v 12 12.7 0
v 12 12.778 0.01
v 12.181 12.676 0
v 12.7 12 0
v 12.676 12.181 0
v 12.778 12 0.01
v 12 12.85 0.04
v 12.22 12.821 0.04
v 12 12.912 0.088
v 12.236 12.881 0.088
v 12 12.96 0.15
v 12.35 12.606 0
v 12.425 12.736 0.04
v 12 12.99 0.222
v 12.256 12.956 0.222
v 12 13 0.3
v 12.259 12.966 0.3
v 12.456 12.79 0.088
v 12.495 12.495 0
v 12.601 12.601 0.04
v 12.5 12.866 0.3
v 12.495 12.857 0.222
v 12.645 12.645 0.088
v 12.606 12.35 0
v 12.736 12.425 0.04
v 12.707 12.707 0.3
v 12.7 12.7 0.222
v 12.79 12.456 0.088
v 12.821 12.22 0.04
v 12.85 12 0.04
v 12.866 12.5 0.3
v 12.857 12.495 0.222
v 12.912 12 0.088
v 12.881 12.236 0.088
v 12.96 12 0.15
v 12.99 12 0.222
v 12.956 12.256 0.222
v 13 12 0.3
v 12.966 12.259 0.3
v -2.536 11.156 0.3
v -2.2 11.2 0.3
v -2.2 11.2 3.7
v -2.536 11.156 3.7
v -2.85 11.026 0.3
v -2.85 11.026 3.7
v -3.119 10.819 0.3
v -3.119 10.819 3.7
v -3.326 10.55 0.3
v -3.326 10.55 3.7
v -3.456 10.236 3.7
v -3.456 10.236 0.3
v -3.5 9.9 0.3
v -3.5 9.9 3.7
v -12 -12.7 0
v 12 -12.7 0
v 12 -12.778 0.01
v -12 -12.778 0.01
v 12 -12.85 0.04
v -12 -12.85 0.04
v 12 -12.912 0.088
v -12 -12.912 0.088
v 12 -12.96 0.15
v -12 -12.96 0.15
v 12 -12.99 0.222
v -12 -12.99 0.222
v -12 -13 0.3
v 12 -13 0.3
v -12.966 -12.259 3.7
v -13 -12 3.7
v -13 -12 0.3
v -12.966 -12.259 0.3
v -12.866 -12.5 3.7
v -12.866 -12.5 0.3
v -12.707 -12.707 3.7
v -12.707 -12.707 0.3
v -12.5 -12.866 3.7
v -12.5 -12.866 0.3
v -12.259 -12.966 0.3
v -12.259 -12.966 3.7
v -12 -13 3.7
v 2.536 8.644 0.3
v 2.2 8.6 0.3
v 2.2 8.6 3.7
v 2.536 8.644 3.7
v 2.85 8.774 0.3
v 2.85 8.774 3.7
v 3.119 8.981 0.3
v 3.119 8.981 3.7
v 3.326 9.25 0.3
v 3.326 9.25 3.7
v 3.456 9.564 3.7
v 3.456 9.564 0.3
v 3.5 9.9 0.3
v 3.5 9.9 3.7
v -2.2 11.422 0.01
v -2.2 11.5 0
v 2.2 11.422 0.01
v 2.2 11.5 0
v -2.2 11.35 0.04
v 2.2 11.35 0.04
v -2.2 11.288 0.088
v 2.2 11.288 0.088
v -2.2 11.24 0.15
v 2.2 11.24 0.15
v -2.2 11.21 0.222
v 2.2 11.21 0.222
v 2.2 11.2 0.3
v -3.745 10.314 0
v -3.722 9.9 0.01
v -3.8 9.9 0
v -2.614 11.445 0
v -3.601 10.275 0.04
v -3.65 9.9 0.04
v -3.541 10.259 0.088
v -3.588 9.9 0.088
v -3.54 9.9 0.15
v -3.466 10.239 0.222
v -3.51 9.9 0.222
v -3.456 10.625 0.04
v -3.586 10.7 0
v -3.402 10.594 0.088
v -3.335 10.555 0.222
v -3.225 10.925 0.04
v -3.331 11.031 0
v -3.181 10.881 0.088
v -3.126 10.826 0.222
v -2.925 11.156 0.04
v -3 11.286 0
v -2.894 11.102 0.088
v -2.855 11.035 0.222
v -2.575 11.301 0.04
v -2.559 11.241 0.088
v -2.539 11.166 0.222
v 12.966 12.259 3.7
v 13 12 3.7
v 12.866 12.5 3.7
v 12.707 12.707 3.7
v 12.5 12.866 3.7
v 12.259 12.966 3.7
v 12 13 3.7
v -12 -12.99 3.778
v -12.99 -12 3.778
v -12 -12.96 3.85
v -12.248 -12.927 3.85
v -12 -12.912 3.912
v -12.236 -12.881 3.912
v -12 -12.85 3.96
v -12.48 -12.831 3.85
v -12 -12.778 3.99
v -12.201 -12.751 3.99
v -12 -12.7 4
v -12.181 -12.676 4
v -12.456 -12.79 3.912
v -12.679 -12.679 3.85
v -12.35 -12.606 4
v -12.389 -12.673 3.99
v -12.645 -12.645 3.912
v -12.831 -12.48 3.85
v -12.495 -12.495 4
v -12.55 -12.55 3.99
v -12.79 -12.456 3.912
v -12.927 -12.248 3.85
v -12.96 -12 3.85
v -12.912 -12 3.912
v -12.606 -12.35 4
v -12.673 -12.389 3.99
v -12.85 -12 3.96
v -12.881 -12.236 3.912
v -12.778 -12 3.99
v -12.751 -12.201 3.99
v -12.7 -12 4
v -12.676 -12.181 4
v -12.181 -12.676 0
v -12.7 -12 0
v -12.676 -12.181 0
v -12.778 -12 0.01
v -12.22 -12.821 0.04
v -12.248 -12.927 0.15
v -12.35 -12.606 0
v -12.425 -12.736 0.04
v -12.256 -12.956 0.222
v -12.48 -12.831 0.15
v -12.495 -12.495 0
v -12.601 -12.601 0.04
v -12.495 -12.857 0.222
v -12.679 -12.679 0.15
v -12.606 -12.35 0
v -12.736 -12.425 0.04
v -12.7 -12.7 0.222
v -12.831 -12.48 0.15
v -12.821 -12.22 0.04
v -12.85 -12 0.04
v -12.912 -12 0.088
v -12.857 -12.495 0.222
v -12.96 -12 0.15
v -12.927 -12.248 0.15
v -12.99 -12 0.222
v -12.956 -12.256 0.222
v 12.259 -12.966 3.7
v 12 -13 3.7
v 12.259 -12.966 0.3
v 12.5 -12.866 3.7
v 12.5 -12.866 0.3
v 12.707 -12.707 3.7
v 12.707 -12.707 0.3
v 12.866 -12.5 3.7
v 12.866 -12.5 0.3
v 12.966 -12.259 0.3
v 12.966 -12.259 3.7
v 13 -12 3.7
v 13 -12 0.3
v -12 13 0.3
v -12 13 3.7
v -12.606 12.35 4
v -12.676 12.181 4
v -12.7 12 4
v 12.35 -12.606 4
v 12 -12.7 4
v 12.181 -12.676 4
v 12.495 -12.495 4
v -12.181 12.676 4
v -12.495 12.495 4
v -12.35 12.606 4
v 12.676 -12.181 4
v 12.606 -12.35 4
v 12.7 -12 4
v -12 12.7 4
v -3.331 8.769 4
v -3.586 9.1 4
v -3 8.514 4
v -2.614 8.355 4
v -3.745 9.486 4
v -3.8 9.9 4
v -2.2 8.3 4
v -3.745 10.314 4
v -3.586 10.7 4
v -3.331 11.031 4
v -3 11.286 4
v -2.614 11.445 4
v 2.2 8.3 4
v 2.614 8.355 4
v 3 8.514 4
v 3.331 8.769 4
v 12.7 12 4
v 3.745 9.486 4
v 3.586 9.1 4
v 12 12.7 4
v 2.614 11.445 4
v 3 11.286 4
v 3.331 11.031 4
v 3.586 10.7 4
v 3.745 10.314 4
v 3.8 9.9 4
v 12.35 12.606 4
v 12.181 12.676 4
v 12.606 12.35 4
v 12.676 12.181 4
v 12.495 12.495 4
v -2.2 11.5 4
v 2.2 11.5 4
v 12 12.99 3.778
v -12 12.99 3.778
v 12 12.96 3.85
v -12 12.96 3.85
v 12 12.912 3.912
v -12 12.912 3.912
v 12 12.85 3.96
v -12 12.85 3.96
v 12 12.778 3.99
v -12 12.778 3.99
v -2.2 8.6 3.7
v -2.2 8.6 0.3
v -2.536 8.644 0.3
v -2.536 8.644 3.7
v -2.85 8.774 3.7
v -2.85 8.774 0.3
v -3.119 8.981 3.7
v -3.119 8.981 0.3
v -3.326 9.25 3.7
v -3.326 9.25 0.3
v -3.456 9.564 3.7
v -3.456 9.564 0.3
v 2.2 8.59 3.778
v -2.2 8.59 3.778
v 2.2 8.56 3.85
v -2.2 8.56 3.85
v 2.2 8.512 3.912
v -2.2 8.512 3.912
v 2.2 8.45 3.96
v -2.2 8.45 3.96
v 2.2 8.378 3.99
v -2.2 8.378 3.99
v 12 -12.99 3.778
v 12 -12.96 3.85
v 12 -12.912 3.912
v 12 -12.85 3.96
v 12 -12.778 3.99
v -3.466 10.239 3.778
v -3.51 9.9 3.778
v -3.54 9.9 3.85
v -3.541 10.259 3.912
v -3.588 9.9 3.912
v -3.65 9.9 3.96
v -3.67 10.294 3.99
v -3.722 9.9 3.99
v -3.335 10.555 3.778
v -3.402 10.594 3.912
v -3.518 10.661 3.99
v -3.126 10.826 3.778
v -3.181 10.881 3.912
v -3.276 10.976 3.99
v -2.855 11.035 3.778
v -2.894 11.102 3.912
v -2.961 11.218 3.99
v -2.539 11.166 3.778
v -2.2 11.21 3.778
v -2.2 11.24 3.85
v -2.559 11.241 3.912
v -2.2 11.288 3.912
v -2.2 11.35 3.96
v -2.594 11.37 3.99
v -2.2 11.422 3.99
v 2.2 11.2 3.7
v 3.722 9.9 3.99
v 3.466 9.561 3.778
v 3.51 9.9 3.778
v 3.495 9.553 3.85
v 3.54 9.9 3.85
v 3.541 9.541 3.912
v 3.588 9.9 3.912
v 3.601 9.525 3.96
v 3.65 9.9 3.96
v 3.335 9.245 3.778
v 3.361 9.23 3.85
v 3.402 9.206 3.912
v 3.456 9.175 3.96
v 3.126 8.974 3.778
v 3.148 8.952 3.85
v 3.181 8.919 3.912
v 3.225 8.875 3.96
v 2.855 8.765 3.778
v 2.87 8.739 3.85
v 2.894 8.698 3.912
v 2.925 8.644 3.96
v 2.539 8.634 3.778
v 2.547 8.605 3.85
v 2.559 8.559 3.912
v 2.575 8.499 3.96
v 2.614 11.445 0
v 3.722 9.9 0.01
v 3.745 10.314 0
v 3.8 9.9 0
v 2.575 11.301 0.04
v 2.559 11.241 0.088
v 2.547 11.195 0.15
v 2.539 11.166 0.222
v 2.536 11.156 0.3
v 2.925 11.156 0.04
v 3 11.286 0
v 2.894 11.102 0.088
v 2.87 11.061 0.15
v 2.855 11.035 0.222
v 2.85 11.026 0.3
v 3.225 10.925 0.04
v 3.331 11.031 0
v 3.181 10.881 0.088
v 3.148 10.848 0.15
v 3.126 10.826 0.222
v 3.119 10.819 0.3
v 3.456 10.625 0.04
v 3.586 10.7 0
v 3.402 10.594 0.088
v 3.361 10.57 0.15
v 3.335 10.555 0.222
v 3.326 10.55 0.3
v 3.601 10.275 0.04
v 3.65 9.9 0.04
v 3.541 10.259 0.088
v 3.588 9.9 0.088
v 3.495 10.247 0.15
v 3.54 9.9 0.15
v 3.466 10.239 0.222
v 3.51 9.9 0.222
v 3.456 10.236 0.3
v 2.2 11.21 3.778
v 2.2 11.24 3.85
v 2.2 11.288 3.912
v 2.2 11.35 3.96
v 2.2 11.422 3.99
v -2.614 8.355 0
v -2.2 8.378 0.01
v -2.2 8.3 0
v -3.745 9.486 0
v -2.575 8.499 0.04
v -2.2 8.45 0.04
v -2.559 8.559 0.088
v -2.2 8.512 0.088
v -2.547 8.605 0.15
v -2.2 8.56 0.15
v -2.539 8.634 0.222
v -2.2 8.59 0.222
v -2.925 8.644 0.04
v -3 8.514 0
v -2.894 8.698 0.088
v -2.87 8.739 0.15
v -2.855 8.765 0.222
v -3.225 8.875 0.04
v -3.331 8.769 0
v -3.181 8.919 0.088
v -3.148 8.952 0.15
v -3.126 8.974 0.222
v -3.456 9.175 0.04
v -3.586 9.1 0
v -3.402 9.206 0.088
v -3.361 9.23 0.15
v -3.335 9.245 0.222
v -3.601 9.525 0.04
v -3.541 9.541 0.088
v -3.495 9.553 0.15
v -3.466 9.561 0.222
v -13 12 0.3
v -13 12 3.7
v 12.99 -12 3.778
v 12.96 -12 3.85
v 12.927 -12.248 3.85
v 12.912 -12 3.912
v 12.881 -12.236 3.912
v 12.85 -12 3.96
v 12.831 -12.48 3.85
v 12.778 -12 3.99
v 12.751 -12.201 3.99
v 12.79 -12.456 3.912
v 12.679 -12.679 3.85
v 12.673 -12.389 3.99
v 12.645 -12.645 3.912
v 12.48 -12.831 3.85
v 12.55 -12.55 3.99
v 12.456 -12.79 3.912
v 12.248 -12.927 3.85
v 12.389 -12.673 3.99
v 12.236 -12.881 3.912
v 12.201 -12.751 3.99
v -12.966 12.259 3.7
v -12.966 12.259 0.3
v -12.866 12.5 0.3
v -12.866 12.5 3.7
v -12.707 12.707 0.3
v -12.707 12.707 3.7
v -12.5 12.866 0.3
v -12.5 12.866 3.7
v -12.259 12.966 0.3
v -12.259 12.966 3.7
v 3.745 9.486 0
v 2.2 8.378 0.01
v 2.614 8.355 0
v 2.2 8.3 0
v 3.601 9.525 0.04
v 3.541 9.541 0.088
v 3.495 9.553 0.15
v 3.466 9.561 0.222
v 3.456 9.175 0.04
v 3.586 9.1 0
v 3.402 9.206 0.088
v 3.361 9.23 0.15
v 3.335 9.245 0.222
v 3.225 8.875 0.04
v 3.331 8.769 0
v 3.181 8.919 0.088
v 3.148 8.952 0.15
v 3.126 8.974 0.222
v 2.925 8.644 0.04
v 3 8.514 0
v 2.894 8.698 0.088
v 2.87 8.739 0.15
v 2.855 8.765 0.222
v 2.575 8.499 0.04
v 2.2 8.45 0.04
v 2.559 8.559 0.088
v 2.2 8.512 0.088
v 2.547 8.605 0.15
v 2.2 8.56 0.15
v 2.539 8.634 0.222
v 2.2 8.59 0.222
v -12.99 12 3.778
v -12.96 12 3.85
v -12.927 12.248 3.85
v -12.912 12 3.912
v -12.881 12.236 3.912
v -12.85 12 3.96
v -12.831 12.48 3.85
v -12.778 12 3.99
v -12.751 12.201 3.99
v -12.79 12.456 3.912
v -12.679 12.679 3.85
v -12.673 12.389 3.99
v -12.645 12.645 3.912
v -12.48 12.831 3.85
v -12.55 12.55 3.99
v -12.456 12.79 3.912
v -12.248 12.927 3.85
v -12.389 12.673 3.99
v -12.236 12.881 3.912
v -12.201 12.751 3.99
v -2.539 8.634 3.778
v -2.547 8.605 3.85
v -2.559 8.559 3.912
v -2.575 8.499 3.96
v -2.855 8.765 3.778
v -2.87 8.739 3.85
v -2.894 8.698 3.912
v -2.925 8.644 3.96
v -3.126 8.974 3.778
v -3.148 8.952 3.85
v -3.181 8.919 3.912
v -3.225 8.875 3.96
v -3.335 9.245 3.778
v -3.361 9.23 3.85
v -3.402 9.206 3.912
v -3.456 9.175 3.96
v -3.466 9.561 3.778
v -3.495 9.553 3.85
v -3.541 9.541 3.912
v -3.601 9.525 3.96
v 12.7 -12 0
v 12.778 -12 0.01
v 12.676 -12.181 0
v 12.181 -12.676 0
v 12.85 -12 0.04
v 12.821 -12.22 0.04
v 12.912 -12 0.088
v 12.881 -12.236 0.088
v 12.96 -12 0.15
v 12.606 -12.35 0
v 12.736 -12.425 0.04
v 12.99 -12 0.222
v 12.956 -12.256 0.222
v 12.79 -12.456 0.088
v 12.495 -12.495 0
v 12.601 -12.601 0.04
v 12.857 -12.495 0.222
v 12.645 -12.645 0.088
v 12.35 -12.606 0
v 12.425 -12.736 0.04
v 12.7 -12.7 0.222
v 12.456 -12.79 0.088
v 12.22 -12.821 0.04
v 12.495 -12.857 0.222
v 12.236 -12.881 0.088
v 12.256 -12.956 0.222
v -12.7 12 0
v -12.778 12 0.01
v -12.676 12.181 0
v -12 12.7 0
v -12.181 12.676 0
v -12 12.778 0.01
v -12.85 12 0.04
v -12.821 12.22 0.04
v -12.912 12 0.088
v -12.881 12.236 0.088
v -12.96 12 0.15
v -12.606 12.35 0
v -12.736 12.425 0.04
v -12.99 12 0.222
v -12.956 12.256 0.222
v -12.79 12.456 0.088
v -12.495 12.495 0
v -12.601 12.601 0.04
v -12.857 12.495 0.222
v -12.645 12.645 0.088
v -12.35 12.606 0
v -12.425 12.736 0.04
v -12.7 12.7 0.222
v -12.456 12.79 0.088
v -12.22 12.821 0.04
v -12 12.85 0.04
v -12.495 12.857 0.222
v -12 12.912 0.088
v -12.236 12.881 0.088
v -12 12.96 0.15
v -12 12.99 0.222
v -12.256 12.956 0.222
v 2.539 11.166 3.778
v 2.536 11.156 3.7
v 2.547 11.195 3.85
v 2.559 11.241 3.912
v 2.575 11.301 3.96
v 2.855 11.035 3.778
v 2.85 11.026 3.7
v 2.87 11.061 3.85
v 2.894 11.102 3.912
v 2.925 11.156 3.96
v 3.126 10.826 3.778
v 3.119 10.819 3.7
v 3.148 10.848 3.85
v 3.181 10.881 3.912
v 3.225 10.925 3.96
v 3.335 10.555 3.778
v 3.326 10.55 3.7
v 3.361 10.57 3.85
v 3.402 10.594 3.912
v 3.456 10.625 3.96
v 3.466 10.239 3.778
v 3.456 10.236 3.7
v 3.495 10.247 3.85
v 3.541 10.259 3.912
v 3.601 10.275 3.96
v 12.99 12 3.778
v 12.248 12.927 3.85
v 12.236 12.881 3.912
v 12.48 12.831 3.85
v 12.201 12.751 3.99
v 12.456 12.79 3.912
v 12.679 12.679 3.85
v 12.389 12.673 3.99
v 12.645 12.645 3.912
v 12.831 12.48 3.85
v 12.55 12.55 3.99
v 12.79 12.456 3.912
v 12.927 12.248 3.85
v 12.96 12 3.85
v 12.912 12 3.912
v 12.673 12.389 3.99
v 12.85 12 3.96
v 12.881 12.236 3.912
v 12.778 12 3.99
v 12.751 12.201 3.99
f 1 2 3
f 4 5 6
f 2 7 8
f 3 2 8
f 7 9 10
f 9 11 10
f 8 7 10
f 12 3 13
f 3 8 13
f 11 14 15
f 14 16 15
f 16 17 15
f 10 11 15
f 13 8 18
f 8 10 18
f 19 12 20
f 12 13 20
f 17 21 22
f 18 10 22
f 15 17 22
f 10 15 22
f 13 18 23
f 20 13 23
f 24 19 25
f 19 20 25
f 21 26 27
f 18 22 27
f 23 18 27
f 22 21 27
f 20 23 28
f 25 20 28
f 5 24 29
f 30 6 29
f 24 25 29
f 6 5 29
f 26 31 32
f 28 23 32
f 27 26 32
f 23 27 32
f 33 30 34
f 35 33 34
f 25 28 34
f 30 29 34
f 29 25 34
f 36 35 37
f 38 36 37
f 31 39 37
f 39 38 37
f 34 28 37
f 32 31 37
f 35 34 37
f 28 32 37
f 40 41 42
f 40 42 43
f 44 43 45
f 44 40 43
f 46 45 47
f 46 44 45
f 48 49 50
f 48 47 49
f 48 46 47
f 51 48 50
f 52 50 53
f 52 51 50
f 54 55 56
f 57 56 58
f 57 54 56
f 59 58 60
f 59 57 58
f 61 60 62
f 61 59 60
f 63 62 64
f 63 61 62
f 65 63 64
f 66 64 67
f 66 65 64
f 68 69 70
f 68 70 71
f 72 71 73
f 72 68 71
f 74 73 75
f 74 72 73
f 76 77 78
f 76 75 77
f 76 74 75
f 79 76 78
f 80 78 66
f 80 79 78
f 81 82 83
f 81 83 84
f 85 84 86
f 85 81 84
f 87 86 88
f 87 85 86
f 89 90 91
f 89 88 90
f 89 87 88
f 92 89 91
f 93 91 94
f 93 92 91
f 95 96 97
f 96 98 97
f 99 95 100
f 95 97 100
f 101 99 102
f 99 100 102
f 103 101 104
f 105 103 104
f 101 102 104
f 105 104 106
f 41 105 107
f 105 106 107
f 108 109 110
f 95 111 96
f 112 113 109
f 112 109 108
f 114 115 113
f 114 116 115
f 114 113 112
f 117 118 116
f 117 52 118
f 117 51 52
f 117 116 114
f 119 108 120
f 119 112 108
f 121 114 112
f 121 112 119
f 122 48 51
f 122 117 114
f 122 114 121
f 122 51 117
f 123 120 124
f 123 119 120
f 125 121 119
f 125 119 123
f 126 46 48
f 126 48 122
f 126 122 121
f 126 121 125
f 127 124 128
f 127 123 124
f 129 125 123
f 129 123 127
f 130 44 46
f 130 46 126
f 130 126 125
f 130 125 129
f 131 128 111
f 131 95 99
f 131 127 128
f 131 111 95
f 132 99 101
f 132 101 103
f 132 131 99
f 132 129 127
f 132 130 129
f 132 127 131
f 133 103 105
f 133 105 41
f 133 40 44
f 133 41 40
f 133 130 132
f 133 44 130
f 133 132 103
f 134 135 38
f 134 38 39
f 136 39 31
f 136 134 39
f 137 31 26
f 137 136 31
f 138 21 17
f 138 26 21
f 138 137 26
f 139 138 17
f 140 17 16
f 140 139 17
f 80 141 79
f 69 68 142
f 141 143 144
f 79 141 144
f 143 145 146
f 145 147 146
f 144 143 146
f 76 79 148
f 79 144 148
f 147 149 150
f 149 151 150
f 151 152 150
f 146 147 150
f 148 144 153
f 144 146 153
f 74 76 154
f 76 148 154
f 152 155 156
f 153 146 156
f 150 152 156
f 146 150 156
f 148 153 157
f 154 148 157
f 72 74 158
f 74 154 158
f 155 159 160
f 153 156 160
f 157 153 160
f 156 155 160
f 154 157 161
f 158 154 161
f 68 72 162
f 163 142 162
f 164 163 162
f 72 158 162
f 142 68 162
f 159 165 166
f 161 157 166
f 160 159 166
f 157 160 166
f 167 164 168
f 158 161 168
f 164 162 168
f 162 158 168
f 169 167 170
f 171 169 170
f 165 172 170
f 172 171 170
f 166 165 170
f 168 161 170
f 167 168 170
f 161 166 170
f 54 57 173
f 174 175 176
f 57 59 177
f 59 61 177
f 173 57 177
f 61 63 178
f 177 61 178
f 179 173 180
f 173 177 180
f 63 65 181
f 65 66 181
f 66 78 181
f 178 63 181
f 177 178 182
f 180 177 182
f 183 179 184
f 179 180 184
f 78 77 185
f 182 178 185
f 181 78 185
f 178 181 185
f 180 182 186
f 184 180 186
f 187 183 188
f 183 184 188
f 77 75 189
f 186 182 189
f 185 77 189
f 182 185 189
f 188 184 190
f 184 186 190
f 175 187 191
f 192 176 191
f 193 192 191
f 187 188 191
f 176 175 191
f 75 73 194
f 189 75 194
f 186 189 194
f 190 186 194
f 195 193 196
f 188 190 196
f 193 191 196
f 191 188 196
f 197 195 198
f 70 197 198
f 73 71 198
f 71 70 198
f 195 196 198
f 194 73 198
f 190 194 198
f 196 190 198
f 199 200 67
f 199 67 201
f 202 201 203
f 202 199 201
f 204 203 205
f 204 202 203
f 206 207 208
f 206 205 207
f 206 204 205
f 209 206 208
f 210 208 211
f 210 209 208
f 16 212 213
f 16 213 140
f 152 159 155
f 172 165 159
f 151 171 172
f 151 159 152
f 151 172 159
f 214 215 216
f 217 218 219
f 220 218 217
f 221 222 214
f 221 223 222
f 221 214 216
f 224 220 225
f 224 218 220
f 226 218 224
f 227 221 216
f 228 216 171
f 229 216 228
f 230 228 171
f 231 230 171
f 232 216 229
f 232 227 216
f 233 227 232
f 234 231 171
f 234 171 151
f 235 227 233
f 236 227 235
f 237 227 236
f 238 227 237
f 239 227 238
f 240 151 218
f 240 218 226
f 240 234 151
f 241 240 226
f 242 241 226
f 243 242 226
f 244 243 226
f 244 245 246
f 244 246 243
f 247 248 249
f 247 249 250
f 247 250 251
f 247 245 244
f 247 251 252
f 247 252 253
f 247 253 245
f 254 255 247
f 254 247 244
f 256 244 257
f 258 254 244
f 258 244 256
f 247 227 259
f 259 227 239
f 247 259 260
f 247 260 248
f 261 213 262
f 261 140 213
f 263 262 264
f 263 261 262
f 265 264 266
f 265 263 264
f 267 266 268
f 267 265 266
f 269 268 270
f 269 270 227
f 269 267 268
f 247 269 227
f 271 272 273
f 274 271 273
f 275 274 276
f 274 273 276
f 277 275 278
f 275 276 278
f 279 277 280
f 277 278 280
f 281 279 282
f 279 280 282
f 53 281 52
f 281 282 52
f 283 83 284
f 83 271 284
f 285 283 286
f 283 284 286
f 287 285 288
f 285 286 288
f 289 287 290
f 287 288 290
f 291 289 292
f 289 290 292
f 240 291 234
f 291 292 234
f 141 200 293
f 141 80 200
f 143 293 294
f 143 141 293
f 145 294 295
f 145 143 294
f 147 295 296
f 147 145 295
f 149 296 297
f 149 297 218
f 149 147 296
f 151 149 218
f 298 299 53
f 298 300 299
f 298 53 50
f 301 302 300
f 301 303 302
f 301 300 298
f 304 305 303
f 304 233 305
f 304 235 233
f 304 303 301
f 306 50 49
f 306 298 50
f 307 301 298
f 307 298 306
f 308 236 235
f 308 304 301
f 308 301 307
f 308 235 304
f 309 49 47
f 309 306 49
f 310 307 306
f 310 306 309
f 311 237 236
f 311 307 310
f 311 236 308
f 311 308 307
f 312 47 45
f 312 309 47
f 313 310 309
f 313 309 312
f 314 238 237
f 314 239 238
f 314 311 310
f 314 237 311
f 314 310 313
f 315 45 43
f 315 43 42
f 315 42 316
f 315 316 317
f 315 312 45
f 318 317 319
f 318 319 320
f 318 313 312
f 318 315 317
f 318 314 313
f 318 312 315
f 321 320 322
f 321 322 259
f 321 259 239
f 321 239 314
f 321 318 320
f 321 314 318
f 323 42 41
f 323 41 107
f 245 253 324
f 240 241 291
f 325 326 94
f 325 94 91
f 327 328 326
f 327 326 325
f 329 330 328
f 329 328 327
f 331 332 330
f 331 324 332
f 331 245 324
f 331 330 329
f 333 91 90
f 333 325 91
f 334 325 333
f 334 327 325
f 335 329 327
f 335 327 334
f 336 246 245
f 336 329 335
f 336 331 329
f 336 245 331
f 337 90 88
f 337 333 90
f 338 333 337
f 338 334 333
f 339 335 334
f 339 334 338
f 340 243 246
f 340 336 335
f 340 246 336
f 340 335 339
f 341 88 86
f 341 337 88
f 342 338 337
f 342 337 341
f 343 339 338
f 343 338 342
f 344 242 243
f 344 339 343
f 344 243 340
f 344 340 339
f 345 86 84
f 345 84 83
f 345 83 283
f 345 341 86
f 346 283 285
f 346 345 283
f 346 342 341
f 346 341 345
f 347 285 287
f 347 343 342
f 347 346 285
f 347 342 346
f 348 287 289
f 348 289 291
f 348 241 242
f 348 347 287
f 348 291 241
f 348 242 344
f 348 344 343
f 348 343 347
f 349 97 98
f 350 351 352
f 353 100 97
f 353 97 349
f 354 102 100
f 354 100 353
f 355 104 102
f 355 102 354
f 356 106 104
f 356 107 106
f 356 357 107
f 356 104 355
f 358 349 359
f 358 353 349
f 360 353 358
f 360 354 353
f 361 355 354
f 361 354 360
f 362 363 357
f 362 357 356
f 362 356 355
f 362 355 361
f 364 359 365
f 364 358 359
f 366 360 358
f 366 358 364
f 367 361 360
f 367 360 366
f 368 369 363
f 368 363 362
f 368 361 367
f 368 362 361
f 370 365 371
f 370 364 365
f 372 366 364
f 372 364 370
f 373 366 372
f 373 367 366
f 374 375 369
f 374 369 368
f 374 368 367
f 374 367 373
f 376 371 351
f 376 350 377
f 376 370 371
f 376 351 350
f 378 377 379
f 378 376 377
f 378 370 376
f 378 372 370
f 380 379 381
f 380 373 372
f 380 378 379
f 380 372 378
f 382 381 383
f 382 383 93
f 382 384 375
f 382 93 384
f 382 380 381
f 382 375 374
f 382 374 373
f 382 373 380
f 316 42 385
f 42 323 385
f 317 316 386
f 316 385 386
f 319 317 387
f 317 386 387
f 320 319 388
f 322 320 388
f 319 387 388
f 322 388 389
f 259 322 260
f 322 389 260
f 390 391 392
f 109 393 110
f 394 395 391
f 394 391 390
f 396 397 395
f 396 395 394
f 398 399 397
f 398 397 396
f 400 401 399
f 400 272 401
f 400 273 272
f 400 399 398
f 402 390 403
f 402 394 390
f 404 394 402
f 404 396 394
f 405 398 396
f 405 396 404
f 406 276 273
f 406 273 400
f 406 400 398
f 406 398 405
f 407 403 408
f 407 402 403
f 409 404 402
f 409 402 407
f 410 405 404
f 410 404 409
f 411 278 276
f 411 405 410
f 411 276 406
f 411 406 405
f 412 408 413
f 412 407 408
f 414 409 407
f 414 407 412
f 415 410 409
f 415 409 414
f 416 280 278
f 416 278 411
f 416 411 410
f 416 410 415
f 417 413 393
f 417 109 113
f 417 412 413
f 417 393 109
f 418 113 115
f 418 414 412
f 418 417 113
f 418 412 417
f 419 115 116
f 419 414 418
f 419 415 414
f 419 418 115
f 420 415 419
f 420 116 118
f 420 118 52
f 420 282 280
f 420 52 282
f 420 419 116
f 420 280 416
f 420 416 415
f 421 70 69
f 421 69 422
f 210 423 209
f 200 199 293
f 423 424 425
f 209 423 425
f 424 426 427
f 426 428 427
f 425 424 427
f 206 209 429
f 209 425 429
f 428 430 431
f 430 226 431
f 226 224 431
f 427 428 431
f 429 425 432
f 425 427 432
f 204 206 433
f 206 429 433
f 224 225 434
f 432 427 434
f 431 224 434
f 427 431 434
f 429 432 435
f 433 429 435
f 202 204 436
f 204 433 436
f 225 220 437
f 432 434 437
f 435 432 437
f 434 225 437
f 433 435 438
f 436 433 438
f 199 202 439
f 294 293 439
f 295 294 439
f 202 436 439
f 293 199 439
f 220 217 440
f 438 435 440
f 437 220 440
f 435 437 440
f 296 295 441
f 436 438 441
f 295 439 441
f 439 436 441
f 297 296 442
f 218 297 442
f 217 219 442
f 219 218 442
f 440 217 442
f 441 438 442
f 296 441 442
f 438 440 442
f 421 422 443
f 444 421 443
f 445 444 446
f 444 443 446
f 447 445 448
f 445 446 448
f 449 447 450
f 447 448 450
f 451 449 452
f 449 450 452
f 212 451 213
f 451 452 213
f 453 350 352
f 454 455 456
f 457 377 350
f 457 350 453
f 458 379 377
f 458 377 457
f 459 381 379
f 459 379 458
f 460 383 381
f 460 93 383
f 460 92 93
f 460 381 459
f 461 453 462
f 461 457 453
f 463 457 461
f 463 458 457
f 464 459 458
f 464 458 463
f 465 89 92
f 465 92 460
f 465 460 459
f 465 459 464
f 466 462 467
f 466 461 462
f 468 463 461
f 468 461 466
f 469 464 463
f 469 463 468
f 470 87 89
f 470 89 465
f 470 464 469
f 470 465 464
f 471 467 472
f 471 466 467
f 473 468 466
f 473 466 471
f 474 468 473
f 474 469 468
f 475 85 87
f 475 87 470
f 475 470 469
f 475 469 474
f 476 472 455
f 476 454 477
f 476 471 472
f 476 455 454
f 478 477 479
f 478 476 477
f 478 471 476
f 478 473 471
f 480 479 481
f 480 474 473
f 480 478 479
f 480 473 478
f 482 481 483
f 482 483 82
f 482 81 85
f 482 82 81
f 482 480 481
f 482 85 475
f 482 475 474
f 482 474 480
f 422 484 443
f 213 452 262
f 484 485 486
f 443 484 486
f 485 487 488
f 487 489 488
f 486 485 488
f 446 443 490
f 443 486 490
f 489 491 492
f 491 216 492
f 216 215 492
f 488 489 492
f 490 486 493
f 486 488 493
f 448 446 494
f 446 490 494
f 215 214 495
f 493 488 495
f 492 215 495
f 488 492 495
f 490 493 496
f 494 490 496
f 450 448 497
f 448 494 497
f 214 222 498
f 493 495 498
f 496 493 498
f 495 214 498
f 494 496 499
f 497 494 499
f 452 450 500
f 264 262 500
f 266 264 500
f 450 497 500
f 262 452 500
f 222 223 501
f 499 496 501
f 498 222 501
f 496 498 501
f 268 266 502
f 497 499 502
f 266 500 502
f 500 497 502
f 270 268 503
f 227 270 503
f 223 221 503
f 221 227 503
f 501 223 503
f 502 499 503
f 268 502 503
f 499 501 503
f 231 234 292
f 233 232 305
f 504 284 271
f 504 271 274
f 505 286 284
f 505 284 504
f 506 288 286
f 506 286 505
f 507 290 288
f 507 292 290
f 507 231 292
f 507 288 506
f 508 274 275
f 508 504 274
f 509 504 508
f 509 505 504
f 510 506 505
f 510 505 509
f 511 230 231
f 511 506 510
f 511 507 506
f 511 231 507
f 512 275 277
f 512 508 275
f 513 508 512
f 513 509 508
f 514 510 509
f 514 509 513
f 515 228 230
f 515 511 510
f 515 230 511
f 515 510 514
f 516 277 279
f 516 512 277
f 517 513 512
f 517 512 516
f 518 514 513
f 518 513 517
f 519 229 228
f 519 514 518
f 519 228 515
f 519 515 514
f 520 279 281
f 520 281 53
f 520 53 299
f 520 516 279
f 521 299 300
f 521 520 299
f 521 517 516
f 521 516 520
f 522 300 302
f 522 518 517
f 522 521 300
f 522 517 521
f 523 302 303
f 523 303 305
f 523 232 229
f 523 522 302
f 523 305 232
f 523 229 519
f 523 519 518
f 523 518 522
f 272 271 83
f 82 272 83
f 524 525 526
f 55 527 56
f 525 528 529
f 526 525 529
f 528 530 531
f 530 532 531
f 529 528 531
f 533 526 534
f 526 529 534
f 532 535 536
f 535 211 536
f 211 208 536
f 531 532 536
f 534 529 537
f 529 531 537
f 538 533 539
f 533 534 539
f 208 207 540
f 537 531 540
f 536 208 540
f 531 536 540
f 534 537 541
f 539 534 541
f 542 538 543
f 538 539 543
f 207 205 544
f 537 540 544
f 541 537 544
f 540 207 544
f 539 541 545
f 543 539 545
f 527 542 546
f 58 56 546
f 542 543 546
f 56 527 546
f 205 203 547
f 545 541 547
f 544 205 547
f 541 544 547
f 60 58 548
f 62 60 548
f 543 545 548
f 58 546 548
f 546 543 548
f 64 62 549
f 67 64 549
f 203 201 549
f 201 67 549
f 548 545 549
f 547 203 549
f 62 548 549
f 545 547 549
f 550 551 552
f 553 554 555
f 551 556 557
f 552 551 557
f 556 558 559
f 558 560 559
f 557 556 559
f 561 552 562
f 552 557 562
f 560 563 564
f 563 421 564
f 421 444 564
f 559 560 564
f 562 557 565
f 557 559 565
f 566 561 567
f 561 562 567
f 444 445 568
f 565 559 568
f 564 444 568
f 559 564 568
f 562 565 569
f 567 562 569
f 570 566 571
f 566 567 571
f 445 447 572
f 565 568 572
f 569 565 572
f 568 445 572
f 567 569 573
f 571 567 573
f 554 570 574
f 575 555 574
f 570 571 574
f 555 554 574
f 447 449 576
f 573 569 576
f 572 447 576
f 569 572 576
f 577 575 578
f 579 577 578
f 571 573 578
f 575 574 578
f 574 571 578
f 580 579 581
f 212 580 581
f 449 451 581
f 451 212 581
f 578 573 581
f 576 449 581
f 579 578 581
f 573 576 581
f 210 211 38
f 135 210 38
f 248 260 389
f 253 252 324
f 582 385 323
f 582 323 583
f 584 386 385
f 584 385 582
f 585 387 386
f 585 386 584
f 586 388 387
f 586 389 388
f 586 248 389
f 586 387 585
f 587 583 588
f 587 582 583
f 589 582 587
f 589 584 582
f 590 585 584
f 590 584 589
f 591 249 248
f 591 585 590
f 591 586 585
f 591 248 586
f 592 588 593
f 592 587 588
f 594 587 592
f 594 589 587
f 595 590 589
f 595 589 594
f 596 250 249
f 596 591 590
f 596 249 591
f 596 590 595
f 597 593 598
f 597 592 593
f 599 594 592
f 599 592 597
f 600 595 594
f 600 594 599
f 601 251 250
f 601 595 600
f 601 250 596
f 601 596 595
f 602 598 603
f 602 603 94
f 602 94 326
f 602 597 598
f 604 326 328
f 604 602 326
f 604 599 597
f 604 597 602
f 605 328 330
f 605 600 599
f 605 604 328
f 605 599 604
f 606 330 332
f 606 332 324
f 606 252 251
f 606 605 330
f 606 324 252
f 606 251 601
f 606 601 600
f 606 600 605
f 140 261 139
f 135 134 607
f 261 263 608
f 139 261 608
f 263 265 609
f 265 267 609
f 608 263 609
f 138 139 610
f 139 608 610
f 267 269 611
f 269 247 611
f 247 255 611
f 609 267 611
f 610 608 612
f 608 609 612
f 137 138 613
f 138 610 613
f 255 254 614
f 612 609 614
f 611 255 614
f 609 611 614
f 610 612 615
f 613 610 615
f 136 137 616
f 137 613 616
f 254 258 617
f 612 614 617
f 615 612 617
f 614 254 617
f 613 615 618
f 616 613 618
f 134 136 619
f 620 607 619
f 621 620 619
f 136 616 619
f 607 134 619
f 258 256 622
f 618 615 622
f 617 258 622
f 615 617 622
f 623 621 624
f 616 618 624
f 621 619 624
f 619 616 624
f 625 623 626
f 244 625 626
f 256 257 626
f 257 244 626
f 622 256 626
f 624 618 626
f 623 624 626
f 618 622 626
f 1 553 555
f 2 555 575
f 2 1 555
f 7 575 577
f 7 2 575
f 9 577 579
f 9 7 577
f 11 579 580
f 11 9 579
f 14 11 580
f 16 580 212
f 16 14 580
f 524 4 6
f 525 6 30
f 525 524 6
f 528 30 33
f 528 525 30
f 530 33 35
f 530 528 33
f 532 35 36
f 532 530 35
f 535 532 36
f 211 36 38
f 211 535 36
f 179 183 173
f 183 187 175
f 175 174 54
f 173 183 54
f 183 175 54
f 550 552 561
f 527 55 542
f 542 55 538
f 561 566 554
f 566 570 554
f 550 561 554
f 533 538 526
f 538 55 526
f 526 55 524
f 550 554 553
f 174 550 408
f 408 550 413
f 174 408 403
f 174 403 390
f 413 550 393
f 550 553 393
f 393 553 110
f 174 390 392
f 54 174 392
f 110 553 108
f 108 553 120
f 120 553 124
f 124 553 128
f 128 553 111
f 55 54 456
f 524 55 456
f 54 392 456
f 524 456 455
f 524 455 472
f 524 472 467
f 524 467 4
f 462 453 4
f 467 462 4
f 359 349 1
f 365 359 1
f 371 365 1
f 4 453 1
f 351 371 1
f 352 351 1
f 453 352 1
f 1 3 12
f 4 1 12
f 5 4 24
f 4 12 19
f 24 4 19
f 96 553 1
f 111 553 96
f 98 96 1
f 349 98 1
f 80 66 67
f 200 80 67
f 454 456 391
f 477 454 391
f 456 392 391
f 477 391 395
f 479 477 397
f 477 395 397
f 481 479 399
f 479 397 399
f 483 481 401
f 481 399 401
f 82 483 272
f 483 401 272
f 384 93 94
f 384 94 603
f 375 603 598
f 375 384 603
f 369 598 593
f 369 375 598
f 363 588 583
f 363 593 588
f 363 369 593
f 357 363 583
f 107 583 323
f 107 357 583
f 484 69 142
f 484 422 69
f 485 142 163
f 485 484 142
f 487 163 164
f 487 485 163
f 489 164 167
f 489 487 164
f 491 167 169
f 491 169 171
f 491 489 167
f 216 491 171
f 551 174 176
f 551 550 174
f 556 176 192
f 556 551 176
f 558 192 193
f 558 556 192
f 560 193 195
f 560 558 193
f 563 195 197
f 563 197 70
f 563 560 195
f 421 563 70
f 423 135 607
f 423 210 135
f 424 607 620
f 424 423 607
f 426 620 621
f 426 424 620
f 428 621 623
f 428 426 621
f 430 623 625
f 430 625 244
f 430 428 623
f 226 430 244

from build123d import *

# Parameters (mm, degrees)
F0_W     = 26
F0_H     = 26
F1_DEPTH = 4
F2_R     = 1
F4_W     = 7
F4_H     = 2.6
F5_DEPTH = 25
F6_R     = 1.29999
F7_R     = 0.3


# Not quite as in the source:
# - a fillet or chamfer is up to 0.001 mm smaller than in the source, because OpenCascade refuses the exact size


with BuildPart() as f1:
    # F0 (on Top) → F1 (new body)
    with BuildSketch(Plane.XY):
        Rectangle(F0_W, F0_H)
    extrude(amount=F1_DEPTH)

    # F2
    f2_edges = [f1.edges().sort_by_distance(p)[0] for p in [
        (-13, -13, 2),
        (-13, 13, 2),
        (13, -13, 2),
        (13, 13, 2),
    ]]
    fillet(f2_edges, radius=F2_R)

    # F4 (on face) → F5 (cut)
    with BuildSketch(Plane.XY.offset(4)):
        with Locations((0, 9.9)):
            Rectangle(F4_W, F4_H)
    extrude(amount=-F5_DEPTH, mode=Mode.SUBTRACT)

    # F6 (radius 1.3 in the source; OpenCascade refuses exactly that, so slightly less here)
    f6_edges = [f1.edges().sort_by_distance(p)[0] for p in [
        (-3.5, 11.2, 2),
        (3.5, 11.2, 2),
        (3.5, 8.6, 2),
        (-3.5, 8.6, 2),
    ]]
    fillet(f6_edges, radius=F6_R)

    # F7
    f7_edges = [f1.edges().sort_by_distance(p)[0] for p in [
        (-13, 0, 4),
        (-13, 0, 0),
        (0, 11.2, 4),
        (0, 11.2, 0),
    ]]
    fillet(f7_edges, radius=F7_R)


solid = f1.part
